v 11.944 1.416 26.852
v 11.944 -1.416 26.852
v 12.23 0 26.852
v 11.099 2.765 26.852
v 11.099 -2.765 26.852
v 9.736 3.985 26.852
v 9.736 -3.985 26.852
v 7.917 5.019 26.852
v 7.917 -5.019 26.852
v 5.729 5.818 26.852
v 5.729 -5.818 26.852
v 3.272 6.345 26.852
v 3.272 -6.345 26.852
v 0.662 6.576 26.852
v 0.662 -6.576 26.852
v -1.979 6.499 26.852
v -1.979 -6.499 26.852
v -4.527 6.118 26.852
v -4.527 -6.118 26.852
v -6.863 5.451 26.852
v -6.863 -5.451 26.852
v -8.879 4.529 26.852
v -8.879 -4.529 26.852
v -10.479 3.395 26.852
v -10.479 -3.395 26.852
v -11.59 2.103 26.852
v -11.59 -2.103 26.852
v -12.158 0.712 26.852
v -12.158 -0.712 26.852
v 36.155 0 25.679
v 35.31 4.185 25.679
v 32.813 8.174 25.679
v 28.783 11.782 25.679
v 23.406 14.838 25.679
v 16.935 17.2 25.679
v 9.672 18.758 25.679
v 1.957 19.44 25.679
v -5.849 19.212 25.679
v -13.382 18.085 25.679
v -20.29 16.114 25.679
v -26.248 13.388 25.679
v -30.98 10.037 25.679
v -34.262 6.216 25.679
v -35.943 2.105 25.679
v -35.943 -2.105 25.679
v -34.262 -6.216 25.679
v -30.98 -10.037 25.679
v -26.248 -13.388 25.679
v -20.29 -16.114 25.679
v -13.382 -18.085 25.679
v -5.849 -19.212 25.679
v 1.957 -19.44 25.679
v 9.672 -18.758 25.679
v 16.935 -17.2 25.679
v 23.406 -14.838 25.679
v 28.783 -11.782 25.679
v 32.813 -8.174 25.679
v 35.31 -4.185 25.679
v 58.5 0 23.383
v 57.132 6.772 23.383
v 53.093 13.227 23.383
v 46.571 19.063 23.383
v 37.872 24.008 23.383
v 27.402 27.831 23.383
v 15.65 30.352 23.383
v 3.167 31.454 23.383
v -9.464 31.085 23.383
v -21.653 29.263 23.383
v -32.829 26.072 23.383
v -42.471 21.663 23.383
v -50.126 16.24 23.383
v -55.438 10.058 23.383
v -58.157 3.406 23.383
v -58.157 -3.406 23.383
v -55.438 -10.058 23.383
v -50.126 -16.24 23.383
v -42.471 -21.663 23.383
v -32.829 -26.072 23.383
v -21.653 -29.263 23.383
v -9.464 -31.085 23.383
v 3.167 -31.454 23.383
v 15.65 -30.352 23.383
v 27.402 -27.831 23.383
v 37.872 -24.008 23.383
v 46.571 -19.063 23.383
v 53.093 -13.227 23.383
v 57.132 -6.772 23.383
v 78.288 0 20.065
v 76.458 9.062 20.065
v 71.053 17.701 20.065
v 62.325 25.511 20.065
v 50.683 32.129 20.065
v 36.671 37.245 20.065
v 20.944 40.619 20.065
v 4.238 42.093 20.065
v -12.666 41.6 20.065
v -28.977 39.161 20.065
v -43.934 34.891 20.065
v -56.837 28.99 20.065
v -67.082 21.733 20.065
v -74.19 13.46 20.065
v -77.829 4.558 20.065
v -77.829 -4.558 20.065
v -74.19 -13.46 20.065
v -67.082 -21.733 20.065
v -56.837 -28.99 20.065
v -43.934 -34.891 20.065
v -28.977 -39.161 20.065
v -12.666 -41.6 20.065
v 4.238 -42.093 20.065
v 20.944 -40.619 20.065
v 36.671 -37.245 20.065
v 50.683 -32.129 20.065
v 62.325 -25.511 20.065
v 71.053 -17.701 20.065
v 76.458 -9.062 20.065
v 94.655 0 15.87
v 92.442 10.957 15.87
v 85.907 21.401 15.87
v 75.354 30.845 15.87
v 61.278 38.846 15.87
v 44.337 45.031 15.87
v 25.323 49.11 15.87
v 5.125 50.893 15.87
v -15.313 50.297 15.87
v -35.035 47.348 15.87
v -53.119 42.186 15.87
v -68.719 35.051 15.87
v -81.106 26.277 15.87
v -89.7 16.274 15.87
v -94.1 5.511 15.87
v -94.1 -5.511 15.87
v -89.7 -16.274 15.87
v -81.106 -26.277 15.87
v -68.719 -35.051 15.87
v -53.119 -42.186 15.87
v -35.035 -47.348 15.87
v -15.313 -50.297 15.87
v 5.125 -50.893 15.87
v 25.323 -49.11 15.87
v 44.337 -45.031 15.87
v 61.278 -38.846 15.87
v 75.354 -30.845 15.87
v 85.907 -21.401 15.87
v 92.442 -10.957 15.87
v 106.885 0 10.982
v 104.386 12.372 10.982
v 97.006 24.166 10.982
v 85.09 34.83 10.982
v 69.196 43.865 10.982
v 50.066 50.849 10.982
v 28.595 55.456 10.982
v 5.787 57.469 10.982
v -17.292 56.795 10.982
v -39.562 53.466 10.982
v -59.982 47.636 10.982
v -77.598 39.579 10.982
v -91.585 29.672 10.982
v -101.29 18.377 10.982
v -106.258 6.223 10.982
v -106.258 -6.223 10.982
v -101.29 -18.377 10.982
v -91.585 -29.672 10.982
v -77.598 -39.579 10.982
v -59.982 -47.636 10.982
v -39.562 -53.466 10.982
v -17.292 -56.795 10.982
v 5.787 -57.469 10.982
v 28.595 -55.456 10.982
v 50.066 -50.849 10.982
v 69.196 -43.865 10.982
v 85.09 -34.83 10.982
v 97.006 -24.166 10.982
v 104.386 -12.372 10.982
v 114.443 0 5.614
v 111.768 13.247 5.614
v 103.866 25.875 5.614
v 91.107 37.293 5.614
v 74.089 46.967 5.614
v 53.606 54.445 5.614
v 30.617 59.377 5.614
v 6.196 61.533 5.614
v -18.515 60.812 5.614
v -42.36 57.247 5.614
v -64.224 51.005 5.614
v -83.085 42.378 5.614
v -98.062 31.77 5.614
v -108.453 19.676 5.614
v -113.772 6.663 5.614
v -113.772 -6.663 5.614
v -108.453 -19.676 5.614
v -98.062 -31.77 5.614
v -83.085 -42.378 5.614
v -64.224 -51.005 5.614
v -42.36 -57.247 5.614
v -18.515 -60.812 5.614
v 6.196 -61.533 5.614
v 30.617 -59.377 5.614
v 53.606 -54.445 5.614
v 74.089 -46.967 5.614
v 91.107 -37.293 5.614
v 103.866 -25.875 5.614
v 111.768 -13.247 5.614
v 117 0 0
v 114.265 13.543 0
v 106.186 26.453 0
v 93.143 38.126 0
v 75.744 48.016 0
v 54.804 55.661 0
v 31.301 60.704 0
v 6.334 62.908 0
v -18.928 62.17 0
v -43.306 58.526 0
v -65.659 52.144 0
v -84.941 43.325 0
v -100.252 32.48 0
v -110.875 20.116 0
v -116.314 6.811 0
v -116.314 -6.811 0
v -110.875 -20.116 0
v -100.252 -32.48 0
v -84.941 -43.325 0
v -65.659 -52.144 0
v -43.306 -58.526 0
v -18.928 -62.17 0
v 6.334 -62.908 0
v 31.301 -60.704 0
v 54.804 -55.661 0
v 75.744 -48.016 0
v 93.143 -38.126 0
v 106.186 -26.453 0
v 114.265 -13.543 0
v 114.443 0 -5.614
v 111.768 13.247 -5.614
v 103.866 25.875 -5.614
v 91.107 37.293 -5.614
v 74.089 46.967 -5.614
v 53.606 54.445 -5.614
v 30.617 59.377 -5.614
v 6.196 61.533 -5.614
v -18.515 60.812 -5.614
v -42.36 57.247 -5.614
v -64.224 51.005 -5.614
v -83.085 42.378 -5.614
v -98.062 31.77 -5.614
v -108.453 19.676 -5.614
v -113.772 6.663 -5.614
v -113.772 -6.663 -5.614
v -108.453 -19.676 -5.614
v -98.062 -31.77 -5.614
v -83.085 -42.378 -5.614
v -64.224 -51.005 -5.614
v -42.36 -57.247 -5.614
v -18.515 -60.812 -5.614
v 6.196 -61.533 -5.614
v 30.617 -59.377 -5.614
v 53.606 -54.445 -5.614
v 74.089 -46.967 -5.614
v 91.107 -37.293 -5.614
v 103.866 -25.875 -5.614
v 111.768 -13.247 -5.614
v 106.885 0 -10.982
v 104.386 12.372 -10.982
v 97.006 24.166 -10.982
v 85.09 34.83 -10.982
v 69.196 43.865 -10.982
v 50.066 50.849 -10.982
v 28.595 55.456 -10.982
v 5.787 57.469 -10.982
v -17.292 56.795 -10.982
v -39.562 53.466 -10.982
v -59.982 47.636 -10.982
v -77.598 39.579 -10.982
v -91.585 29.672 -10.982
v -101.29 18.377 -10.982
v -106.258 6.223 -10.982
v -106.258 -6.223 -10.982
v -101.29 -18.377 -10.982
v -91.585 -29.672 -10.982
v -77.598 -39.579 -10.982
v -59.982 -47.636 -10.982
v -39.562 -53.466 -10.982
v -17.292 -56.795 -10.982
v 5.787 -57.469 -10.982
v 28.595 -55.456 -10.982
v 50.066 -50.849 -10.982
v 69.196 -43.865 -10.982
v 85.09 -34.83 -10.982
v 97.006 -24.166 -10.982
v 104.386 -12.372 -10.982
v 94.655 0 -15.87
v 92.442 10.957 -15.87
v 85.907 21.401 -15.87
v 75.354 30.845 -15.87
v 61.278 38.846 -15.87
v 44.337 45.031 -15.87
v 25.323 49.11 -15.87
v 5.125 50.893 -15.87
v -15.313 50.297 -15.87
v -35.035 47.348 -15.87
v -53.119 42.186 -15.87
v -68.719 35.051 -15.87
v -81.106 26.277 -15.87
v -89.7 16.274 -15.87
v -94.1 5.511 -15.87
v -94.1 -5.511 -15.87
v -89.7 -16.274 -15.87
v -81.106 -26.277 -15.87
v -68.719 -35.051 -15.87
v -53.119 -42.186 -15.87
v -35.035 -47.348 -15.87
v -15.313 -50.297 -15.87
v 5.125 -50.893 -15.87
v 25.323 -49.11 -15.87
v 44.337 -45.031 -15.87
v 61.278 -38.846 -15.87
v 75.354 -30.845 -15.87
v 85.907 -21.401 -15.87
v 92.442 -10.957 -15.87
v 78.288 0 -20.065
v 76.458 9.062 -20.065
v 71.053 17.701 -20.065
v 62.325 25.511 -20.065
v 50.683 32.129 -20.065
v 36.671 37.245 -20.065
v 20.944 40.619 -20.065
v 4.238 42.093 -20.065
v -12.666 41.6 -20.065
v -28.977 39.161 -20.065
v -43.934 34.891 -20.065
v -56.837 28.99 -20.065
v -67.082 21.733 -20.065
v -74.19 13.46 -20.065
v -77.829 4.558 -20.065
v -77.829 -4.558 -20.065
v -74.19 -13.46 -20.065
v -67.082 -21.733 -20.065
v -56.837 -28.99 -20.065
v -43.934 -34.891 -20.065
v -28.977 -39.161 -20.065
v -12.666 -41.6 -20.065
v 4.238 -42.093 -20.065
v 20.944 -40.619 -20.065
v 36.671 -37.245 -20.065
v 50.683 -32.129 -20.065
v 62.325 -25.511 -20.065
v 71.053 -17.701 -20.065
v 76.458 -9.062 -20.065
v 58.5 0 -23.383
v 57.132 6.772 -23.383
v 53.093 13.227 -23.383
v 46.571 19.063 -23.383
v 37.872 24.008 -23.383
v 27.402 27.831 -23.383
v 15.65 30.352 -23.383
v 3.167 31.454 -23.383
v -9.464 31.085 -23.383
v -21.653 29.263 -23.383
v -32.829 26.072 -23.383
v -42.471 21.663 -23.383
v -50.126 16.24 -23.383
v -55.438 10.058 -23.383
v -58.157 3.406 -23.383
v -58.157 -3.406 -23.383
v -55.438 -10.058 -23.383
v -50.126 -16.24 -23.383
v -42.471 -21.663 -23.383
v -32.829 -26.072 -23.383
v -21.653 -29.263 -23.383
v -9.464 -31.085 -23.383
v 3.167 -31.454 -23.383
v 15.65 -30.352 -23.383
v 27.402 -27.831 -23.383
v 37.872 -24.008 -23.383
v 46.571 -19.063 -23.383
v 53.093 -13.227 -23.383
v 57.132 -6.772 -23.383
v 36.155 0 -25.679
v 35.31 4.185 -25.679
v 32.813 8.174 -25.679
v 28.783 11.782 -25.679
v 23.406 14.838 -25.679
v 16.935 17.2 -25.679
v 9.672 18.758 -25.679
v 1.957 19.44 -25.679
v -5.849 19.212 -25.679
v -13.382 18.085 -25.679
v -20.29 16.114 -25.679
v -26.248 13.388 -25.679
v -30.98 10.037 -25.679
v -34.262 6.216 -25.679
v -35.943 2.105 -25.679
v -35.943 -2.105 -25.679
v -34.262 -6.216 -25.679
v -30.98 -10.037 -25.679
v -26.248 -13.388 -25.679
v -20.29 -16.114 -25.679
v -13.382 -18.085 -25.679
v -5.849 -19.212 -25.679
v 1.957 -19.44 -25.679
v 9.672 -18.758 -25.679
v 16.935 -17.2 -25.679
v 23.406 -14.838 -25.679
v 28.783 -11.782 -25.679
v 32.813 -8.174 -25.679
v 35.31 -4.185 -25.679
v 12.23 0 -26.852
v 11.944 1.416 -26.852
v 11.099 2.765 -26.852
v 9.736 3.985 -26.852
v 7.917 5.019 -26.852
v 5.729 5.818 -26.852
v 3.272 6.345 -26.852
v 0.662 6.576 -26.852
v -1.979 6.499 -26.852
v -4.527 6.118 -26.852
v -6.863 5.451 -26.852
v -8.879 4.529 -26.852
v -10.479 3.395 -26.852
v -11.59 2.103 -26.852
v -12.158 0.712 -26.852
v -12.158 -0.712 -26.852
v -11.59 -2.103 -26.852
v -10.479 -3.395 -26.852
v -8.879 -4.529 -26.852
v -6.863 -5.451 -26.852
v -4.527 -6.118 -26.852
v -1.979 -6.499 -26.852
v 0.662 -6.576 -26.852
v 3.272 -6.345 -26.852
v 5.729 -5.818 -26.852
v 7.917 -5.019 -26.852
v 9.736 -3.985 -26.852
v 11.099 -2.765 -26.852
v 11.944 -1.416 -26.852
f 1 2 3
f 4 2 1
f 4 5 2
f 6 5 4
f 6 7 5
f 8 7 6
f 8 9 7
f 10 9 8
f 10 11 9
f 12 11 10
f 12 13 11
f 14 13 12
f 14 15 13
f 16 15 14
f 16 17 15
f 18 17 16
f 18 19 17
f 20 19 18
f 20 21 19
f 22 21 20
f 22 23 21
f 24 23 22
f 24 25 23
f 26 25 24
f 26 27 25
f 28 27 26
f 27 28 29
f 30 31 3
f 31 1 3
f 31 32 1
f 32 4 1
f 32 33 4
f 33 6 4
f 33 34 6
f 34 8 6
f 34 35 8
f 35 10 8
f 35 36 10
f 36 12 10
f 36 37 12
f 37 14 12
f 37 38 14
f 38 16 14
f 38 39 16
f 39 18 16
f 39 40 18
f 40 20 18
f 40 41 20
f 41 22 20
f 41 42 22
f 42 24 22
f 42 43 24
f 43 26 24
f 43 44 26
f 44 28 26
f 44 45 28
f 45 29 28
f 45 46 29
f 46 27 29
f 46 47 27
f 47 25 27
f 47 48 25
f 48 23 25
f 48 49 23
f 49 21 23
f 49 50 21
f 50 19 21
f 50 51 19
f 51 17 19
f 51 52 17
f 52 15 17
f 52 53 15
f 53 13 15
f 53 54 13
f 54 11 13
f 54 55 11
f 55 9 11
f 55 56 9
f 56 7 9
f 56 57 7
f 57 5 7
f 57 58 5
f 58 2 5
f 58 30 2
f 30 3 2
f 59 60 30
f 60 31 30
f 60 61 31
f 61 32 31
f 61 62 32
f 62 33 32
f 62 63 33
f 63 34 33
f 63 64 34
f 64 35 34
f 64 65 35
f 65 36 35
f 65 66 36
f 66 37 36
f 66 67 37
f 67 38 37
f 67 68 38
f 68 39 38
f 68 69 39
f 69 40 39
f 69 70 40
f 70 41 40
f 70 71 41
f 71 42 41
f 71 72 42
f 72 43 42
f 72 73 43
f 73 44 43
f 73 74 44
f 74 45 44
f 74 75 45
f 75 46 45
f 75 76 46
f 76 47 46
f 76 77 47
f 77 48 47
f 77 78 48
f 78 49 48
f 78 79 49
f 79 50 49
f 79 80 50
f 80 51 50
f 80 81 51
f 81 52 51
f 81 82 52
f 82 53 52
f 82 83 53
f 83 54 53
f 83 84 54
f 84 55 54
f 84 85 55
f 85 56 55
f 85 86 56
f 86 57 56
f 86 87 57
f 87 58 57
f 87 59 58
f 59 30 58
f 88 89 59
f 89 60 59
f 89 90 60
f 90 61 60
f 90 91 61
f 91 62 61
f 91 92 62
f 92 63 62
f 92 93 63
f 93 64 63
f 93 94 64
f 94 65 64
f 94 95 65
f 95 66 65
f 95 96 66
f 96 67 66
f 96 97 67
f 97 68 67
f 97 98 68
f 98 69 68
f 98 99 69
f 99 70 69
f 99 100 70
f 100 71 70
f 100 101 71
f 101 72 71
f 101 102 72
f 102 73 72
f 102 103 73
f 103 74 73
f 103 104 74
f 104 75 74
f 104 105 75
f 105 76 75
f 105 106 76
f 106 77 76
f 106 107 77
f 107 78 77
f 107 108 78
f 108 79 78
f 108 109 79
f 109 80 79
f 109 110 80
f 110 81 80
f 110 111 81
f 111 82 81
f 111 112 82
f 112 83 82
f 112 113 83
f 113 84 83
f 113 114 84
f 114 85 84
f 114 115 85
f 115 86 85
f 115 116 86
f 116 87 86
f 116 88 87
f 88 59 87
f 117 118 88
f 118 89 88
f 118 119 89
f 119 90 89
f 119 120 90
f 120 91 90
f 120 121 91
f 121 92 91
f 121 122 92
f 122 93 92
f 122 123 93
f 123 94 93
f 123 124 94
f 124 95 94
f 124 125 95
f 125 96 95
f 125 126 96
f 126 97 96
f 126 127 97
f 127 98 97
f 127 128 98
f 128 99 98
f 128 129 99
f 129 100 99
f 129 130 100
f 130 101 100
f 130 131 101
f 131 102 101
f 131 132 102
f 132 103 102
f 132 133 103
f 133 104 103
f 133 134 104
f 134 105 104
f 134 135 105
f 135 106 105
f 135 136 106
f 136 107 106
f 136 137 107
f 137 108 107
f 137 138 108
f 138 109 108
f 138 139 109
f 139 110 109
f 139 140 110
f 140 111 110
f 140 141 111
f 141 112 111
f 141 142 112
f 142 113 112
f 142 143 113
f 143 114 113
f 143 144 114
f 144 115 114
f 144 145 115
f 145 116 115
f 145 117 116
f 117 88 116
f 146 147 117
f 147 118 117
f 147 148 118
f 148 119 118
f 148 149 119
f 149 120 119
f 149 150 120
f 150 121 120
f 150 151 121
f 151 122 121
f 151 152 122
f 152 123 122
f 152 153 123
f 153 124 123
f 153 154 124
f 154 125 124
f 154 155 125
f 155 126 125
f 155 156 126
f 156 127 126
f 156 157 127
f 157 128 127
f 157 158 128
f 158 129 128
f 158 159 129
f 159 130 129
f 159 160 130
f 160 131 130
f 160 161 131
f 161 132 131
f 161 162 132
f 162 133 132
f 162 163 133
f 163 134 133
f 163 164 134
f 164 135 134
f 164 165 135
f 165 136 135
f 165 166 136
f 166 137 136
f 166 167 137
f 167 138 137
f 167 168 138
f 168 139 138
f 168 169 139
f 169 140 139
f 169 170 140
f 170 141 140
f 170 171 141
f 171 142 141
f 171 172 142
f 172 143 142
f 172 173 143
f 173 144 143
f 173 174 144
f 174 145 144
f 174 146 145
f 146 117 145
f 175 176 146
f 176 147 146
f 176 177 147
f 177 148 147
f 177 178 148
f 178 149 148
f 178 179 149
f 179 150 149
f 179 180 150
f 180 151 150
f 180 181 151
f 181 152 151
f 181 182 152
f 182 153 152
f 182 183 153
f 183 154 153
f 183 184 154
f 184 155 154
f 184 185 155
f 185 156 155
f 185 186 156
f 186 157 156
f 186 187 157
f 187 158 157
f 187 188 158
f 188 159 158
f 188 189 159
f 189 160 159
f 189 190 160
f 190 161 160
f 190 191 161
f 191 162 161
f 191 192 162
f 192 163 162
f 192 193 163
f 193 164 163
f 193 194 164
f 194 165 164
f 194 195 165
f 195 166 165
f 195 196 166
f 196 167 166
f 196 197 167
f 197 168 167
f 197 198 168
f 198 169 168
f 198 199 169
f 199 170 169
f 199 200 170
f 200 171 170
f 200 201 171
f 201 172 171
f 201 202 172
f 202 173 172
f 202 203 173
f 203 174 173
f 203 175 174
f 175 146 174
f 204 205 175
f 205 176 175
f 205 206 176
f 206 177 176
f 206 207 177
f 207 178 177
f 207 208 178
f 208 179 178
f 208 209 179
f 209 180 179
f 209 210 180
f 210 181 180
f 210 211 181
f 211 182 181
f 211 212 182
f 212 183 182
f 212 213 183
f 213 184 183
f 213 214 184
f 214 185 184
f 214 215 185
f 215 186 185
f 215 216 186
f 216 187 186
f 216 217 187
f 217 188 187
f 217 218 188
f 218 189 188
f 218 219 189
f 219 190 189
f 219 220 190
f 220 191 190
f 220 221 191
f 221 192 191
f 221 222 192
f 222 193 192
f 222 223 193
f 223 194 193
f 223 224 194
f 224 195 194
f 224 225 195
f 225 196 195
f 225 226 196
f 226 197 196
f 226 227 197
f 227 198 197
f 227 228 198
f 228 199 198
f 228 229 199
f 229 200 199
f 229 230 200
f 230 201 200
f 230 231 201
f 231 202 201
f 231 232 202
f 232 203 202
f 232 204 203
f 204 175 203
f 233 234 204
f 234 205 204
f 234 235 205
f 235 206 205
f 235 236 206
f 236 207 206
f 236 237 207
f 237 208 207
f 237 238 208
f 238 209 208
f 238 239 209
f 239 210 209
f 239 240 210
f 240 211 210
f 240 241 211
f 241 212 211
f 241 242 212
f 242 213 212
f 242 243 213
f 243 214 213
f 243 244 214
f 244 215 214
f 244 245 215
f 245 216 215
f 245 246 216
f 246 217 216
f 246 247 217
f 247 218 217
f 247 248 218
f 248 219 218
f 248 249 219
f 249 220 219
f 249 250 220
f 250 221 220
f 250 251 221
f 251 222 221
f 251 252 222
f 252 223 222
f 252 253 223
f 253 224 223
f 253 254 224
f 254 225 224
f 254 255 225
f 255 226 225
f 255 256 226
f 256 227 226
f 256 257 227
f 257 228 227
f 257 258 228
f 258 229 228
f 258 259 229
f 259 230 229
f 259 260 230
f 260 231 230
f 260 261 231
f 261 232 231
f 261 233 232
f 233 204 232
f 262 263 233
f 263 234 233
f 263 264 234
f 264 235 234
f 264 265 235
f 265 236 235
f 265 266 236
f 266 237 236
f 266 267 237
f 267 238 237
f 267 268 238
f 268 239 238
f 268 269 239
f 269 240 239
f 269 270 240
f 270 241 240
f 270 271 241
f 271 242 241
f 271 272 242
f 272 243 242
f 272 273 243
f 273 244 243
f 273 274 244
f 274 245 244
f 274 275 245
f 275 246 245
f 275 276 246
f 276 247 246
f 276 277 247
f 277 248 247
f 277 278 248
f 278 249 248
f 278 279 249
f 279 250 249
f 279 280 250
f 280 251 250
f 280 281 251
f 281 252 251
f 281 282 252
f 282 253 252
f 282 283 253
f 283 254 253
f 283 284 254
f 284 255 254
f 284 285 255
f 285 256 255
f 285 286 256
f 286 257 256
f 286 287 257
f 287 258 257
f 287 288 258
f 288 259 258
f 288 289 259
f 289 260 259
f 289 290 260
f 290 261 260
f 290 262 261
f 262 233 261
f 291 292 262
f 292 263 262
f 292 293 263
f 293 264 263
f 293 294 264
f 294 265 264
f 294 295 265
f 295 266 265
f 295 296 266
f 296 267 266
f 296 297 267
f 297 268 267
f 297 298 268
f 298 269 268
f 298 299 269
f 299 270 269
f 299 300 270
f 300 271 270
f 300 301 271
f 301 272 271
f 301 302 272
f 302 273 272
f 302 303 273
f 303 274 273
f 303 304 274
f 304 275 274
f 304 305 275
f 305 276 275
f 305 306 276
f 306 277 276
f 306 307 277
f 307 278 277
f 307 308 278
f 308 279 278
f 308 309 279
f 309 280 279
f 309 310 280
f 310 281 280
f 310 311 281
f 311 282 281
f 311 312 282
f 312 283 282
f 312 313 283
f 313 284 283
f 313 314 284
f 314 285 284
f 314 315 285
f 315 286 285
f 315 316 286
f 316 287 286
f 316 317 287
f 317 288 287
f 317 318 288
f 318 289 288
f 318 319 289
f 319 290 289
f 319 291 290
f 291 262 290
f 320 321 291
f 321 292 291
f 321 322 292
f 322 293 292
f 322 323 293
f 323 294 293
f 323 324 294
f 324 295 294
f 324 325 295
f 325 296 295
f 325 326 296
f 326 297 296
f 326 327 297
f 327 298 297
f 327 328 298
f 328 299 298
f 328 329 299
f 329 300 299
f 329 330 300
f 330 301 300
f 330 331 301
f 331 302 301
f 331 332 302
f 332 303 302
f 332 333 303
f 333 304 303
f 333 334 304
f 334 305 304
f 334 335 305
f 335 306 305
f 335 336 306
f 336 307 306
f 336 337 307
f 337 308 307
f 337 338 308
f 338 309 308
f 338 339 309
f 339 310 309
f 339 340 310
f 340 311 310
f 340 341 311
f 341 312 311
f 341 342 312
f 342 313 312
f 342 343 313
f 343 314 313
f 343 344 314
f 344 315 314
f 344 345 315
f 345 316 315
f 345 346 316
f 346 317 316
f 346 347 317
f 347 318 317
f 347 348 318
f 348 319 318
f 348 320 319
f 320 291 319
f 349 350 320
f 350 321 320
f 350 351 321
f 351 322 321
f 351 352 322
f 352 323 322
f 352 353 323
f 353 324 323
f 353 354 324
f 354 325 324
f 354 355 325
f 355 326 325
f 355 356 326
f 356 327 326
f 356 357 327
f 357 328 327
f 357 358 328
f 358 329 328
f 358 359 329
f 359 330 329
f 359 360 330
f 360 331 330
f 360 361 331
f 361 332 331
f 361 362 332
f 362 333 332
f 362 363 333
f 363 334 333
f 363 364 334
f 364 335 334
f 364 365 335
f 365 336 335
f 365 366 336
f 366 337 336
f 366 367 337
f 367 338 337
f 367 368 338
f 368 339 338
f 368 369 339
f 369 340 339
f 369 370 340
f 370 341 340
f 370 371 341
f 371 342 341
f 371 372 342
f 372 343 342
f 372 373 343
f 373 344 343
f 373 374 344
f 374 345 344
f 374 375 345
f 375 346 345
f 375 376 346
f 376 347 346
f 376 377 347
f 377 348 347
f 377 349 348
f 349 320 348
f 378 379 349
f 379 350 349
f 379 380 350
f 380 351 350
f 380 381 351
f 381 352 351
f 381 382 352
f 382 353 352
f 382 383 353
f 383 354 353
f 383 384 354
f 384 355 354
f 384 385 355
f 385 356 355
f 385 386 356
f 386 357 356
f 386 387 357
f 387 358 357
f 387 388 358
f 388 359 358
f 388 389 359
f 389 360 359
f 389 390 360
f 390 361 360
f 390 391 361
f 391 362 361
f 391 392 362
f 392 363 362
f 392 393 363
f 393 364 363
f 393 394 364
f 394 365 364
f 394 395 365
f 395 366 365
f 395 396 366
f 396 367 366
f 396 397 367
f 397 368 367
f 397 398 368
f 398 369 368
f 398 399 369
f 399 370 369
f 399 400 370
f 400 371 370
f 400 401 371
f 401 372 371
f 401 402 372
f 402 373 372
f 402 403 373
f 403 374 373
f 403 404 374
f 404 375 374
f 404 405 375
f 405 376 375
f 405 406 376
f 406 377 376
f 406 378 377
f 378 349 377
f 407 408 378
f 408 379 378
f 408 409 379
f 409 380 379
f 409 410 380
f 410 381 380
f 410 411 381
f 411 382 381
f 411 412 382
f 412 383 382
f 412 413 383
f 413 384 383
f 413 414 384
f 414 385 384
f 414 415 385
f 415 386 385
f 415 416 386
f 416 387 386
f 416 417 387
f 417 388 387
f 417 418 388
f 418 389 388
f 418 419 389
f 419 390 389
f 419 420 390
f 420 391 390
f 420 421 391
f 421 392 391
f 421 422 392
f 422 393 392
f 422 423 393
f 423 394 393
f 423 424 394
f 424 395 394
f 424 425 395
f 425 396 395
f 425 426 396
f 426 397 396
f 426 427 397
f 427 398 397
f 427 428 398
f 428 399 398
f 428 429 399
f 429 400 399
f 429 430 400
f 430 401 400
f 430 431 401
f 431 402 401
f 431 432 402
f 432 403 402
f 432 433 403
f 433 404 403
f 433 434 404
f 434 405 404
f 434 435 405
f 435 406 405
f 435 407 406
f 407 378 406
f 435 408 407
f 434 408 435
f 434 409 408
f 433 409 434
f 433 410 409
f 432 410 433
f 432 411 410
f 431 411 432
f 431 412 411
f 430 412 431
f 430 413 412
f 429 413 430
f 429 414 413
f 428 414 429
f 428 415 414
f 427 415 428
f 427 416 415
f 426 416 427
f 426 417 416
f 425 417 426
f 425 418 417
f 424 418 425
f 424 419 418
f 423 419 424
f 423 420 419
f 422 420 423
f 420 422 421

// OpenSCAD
// Generated by SolidPython 1.0.1 on 2020-07-29 00:46:50


scale(v = [13, 7, 3]) {
	sphere(r = 9);
}
/***********************************************
*********      SolidPython code:      **********
************************************************
 
# import packages: SolidPython
from solid import *
from solid.utils import *
from itertools import chain, combinations, permutations


class Resize:

    def __init__(self, scad_file):
        self.scad_file = scad_file
        #self.scad_file = import_scad(scad_file)
        # cone/cylinder param:
        self.r1 = 0
        self.r2 = 0
        self.h = 0
        # rectangular prism param:
        self.w = 0
        self.l = 0
        # ellipse param:
        self.r = 0

    # import OpenScad code (file name corresponds to shape)


    # classify shape + parameters
    def assign(self, param1, param2, param3):
        if self.scad_file == 'cone.scad':
            self.r1 = param1
            self.r2 = param2
            self.h = param3
        elif self.scad_file == 'cylinder.scad':
            self.r1 = param1
            self.r2 = param2
            self.h = param3
        elif self.scad_file == 'rectangularPrism.scad':
            self.h = param1
            self.l = param2
            self.w = param3
        else:
            self.r = param1
            self.h = param2

    # resize parameters
    def iterate(self):
        x = range(3, 20, 2)
        i = 1
        if self.scad_file == 'cone.scad':
            tempList = list(permutations(x, 2))
            for temp in tempList:
                param1 = temp[0]
                param2 = temp[1]
                filepath = 'produced_scad_files/' + 'cone' + str(param1) + '_' + str(param2) + '_' + '.scad'
                scad_render_to_file(cylinder(h=param1, r1=param2, r2=0), filepath)

        elif self.scad_file == 'cylinder.scad':
            tempList = list(permutations(x, 3))
            for temp in tempList:
                param1 = temp[0]
                param2 = temp[1]
                filepath = 'produced_scad_files/' + 'cylinder' + str(param1) + '_' + str(param2) + '_' + '.scad'
                scad_render_to_file(cylinder(h=param1, r1=param2, r2=param2), filepath)

        elif self.scad_file == 'rectangularPrism.scad':
            tempList = list(permutations(x, 3))
            for temp in tempList:
                param1 = temp[0]
                param2 = temp[1]
                param3 = temp[2]
                filepath = 'produced_scad_files/' + 'rectangularPrism' + str(param1) + '_' + str(param2) + '_' + str(
                    param3) + '.scad'
                scad_render_to_file(cube(size=(param1, param2, param3)), filepath)

        elif self.scad_file == 'ellipse.scad':
            tempList = list(permutations(x, 4))
            for temp in tempList:
                param1 = temp[0]
                param2 = temp[1]
                param3 = temp[2]
                param4 = temp[3]
                filepath = 'produced_scad_files/' + 'ellipse' + str(param1) + '_' + str(param2) + '_' + str(param3) + '_' + str(param4) + '.scad'
                scad_render_to_file(scale([param1, param2, param3])(sphere(r=param4)), filepath)

    def render_to_scadfile(self):
        scad_render_to_file(scad, 'example.scad') 
 
************************************************/
